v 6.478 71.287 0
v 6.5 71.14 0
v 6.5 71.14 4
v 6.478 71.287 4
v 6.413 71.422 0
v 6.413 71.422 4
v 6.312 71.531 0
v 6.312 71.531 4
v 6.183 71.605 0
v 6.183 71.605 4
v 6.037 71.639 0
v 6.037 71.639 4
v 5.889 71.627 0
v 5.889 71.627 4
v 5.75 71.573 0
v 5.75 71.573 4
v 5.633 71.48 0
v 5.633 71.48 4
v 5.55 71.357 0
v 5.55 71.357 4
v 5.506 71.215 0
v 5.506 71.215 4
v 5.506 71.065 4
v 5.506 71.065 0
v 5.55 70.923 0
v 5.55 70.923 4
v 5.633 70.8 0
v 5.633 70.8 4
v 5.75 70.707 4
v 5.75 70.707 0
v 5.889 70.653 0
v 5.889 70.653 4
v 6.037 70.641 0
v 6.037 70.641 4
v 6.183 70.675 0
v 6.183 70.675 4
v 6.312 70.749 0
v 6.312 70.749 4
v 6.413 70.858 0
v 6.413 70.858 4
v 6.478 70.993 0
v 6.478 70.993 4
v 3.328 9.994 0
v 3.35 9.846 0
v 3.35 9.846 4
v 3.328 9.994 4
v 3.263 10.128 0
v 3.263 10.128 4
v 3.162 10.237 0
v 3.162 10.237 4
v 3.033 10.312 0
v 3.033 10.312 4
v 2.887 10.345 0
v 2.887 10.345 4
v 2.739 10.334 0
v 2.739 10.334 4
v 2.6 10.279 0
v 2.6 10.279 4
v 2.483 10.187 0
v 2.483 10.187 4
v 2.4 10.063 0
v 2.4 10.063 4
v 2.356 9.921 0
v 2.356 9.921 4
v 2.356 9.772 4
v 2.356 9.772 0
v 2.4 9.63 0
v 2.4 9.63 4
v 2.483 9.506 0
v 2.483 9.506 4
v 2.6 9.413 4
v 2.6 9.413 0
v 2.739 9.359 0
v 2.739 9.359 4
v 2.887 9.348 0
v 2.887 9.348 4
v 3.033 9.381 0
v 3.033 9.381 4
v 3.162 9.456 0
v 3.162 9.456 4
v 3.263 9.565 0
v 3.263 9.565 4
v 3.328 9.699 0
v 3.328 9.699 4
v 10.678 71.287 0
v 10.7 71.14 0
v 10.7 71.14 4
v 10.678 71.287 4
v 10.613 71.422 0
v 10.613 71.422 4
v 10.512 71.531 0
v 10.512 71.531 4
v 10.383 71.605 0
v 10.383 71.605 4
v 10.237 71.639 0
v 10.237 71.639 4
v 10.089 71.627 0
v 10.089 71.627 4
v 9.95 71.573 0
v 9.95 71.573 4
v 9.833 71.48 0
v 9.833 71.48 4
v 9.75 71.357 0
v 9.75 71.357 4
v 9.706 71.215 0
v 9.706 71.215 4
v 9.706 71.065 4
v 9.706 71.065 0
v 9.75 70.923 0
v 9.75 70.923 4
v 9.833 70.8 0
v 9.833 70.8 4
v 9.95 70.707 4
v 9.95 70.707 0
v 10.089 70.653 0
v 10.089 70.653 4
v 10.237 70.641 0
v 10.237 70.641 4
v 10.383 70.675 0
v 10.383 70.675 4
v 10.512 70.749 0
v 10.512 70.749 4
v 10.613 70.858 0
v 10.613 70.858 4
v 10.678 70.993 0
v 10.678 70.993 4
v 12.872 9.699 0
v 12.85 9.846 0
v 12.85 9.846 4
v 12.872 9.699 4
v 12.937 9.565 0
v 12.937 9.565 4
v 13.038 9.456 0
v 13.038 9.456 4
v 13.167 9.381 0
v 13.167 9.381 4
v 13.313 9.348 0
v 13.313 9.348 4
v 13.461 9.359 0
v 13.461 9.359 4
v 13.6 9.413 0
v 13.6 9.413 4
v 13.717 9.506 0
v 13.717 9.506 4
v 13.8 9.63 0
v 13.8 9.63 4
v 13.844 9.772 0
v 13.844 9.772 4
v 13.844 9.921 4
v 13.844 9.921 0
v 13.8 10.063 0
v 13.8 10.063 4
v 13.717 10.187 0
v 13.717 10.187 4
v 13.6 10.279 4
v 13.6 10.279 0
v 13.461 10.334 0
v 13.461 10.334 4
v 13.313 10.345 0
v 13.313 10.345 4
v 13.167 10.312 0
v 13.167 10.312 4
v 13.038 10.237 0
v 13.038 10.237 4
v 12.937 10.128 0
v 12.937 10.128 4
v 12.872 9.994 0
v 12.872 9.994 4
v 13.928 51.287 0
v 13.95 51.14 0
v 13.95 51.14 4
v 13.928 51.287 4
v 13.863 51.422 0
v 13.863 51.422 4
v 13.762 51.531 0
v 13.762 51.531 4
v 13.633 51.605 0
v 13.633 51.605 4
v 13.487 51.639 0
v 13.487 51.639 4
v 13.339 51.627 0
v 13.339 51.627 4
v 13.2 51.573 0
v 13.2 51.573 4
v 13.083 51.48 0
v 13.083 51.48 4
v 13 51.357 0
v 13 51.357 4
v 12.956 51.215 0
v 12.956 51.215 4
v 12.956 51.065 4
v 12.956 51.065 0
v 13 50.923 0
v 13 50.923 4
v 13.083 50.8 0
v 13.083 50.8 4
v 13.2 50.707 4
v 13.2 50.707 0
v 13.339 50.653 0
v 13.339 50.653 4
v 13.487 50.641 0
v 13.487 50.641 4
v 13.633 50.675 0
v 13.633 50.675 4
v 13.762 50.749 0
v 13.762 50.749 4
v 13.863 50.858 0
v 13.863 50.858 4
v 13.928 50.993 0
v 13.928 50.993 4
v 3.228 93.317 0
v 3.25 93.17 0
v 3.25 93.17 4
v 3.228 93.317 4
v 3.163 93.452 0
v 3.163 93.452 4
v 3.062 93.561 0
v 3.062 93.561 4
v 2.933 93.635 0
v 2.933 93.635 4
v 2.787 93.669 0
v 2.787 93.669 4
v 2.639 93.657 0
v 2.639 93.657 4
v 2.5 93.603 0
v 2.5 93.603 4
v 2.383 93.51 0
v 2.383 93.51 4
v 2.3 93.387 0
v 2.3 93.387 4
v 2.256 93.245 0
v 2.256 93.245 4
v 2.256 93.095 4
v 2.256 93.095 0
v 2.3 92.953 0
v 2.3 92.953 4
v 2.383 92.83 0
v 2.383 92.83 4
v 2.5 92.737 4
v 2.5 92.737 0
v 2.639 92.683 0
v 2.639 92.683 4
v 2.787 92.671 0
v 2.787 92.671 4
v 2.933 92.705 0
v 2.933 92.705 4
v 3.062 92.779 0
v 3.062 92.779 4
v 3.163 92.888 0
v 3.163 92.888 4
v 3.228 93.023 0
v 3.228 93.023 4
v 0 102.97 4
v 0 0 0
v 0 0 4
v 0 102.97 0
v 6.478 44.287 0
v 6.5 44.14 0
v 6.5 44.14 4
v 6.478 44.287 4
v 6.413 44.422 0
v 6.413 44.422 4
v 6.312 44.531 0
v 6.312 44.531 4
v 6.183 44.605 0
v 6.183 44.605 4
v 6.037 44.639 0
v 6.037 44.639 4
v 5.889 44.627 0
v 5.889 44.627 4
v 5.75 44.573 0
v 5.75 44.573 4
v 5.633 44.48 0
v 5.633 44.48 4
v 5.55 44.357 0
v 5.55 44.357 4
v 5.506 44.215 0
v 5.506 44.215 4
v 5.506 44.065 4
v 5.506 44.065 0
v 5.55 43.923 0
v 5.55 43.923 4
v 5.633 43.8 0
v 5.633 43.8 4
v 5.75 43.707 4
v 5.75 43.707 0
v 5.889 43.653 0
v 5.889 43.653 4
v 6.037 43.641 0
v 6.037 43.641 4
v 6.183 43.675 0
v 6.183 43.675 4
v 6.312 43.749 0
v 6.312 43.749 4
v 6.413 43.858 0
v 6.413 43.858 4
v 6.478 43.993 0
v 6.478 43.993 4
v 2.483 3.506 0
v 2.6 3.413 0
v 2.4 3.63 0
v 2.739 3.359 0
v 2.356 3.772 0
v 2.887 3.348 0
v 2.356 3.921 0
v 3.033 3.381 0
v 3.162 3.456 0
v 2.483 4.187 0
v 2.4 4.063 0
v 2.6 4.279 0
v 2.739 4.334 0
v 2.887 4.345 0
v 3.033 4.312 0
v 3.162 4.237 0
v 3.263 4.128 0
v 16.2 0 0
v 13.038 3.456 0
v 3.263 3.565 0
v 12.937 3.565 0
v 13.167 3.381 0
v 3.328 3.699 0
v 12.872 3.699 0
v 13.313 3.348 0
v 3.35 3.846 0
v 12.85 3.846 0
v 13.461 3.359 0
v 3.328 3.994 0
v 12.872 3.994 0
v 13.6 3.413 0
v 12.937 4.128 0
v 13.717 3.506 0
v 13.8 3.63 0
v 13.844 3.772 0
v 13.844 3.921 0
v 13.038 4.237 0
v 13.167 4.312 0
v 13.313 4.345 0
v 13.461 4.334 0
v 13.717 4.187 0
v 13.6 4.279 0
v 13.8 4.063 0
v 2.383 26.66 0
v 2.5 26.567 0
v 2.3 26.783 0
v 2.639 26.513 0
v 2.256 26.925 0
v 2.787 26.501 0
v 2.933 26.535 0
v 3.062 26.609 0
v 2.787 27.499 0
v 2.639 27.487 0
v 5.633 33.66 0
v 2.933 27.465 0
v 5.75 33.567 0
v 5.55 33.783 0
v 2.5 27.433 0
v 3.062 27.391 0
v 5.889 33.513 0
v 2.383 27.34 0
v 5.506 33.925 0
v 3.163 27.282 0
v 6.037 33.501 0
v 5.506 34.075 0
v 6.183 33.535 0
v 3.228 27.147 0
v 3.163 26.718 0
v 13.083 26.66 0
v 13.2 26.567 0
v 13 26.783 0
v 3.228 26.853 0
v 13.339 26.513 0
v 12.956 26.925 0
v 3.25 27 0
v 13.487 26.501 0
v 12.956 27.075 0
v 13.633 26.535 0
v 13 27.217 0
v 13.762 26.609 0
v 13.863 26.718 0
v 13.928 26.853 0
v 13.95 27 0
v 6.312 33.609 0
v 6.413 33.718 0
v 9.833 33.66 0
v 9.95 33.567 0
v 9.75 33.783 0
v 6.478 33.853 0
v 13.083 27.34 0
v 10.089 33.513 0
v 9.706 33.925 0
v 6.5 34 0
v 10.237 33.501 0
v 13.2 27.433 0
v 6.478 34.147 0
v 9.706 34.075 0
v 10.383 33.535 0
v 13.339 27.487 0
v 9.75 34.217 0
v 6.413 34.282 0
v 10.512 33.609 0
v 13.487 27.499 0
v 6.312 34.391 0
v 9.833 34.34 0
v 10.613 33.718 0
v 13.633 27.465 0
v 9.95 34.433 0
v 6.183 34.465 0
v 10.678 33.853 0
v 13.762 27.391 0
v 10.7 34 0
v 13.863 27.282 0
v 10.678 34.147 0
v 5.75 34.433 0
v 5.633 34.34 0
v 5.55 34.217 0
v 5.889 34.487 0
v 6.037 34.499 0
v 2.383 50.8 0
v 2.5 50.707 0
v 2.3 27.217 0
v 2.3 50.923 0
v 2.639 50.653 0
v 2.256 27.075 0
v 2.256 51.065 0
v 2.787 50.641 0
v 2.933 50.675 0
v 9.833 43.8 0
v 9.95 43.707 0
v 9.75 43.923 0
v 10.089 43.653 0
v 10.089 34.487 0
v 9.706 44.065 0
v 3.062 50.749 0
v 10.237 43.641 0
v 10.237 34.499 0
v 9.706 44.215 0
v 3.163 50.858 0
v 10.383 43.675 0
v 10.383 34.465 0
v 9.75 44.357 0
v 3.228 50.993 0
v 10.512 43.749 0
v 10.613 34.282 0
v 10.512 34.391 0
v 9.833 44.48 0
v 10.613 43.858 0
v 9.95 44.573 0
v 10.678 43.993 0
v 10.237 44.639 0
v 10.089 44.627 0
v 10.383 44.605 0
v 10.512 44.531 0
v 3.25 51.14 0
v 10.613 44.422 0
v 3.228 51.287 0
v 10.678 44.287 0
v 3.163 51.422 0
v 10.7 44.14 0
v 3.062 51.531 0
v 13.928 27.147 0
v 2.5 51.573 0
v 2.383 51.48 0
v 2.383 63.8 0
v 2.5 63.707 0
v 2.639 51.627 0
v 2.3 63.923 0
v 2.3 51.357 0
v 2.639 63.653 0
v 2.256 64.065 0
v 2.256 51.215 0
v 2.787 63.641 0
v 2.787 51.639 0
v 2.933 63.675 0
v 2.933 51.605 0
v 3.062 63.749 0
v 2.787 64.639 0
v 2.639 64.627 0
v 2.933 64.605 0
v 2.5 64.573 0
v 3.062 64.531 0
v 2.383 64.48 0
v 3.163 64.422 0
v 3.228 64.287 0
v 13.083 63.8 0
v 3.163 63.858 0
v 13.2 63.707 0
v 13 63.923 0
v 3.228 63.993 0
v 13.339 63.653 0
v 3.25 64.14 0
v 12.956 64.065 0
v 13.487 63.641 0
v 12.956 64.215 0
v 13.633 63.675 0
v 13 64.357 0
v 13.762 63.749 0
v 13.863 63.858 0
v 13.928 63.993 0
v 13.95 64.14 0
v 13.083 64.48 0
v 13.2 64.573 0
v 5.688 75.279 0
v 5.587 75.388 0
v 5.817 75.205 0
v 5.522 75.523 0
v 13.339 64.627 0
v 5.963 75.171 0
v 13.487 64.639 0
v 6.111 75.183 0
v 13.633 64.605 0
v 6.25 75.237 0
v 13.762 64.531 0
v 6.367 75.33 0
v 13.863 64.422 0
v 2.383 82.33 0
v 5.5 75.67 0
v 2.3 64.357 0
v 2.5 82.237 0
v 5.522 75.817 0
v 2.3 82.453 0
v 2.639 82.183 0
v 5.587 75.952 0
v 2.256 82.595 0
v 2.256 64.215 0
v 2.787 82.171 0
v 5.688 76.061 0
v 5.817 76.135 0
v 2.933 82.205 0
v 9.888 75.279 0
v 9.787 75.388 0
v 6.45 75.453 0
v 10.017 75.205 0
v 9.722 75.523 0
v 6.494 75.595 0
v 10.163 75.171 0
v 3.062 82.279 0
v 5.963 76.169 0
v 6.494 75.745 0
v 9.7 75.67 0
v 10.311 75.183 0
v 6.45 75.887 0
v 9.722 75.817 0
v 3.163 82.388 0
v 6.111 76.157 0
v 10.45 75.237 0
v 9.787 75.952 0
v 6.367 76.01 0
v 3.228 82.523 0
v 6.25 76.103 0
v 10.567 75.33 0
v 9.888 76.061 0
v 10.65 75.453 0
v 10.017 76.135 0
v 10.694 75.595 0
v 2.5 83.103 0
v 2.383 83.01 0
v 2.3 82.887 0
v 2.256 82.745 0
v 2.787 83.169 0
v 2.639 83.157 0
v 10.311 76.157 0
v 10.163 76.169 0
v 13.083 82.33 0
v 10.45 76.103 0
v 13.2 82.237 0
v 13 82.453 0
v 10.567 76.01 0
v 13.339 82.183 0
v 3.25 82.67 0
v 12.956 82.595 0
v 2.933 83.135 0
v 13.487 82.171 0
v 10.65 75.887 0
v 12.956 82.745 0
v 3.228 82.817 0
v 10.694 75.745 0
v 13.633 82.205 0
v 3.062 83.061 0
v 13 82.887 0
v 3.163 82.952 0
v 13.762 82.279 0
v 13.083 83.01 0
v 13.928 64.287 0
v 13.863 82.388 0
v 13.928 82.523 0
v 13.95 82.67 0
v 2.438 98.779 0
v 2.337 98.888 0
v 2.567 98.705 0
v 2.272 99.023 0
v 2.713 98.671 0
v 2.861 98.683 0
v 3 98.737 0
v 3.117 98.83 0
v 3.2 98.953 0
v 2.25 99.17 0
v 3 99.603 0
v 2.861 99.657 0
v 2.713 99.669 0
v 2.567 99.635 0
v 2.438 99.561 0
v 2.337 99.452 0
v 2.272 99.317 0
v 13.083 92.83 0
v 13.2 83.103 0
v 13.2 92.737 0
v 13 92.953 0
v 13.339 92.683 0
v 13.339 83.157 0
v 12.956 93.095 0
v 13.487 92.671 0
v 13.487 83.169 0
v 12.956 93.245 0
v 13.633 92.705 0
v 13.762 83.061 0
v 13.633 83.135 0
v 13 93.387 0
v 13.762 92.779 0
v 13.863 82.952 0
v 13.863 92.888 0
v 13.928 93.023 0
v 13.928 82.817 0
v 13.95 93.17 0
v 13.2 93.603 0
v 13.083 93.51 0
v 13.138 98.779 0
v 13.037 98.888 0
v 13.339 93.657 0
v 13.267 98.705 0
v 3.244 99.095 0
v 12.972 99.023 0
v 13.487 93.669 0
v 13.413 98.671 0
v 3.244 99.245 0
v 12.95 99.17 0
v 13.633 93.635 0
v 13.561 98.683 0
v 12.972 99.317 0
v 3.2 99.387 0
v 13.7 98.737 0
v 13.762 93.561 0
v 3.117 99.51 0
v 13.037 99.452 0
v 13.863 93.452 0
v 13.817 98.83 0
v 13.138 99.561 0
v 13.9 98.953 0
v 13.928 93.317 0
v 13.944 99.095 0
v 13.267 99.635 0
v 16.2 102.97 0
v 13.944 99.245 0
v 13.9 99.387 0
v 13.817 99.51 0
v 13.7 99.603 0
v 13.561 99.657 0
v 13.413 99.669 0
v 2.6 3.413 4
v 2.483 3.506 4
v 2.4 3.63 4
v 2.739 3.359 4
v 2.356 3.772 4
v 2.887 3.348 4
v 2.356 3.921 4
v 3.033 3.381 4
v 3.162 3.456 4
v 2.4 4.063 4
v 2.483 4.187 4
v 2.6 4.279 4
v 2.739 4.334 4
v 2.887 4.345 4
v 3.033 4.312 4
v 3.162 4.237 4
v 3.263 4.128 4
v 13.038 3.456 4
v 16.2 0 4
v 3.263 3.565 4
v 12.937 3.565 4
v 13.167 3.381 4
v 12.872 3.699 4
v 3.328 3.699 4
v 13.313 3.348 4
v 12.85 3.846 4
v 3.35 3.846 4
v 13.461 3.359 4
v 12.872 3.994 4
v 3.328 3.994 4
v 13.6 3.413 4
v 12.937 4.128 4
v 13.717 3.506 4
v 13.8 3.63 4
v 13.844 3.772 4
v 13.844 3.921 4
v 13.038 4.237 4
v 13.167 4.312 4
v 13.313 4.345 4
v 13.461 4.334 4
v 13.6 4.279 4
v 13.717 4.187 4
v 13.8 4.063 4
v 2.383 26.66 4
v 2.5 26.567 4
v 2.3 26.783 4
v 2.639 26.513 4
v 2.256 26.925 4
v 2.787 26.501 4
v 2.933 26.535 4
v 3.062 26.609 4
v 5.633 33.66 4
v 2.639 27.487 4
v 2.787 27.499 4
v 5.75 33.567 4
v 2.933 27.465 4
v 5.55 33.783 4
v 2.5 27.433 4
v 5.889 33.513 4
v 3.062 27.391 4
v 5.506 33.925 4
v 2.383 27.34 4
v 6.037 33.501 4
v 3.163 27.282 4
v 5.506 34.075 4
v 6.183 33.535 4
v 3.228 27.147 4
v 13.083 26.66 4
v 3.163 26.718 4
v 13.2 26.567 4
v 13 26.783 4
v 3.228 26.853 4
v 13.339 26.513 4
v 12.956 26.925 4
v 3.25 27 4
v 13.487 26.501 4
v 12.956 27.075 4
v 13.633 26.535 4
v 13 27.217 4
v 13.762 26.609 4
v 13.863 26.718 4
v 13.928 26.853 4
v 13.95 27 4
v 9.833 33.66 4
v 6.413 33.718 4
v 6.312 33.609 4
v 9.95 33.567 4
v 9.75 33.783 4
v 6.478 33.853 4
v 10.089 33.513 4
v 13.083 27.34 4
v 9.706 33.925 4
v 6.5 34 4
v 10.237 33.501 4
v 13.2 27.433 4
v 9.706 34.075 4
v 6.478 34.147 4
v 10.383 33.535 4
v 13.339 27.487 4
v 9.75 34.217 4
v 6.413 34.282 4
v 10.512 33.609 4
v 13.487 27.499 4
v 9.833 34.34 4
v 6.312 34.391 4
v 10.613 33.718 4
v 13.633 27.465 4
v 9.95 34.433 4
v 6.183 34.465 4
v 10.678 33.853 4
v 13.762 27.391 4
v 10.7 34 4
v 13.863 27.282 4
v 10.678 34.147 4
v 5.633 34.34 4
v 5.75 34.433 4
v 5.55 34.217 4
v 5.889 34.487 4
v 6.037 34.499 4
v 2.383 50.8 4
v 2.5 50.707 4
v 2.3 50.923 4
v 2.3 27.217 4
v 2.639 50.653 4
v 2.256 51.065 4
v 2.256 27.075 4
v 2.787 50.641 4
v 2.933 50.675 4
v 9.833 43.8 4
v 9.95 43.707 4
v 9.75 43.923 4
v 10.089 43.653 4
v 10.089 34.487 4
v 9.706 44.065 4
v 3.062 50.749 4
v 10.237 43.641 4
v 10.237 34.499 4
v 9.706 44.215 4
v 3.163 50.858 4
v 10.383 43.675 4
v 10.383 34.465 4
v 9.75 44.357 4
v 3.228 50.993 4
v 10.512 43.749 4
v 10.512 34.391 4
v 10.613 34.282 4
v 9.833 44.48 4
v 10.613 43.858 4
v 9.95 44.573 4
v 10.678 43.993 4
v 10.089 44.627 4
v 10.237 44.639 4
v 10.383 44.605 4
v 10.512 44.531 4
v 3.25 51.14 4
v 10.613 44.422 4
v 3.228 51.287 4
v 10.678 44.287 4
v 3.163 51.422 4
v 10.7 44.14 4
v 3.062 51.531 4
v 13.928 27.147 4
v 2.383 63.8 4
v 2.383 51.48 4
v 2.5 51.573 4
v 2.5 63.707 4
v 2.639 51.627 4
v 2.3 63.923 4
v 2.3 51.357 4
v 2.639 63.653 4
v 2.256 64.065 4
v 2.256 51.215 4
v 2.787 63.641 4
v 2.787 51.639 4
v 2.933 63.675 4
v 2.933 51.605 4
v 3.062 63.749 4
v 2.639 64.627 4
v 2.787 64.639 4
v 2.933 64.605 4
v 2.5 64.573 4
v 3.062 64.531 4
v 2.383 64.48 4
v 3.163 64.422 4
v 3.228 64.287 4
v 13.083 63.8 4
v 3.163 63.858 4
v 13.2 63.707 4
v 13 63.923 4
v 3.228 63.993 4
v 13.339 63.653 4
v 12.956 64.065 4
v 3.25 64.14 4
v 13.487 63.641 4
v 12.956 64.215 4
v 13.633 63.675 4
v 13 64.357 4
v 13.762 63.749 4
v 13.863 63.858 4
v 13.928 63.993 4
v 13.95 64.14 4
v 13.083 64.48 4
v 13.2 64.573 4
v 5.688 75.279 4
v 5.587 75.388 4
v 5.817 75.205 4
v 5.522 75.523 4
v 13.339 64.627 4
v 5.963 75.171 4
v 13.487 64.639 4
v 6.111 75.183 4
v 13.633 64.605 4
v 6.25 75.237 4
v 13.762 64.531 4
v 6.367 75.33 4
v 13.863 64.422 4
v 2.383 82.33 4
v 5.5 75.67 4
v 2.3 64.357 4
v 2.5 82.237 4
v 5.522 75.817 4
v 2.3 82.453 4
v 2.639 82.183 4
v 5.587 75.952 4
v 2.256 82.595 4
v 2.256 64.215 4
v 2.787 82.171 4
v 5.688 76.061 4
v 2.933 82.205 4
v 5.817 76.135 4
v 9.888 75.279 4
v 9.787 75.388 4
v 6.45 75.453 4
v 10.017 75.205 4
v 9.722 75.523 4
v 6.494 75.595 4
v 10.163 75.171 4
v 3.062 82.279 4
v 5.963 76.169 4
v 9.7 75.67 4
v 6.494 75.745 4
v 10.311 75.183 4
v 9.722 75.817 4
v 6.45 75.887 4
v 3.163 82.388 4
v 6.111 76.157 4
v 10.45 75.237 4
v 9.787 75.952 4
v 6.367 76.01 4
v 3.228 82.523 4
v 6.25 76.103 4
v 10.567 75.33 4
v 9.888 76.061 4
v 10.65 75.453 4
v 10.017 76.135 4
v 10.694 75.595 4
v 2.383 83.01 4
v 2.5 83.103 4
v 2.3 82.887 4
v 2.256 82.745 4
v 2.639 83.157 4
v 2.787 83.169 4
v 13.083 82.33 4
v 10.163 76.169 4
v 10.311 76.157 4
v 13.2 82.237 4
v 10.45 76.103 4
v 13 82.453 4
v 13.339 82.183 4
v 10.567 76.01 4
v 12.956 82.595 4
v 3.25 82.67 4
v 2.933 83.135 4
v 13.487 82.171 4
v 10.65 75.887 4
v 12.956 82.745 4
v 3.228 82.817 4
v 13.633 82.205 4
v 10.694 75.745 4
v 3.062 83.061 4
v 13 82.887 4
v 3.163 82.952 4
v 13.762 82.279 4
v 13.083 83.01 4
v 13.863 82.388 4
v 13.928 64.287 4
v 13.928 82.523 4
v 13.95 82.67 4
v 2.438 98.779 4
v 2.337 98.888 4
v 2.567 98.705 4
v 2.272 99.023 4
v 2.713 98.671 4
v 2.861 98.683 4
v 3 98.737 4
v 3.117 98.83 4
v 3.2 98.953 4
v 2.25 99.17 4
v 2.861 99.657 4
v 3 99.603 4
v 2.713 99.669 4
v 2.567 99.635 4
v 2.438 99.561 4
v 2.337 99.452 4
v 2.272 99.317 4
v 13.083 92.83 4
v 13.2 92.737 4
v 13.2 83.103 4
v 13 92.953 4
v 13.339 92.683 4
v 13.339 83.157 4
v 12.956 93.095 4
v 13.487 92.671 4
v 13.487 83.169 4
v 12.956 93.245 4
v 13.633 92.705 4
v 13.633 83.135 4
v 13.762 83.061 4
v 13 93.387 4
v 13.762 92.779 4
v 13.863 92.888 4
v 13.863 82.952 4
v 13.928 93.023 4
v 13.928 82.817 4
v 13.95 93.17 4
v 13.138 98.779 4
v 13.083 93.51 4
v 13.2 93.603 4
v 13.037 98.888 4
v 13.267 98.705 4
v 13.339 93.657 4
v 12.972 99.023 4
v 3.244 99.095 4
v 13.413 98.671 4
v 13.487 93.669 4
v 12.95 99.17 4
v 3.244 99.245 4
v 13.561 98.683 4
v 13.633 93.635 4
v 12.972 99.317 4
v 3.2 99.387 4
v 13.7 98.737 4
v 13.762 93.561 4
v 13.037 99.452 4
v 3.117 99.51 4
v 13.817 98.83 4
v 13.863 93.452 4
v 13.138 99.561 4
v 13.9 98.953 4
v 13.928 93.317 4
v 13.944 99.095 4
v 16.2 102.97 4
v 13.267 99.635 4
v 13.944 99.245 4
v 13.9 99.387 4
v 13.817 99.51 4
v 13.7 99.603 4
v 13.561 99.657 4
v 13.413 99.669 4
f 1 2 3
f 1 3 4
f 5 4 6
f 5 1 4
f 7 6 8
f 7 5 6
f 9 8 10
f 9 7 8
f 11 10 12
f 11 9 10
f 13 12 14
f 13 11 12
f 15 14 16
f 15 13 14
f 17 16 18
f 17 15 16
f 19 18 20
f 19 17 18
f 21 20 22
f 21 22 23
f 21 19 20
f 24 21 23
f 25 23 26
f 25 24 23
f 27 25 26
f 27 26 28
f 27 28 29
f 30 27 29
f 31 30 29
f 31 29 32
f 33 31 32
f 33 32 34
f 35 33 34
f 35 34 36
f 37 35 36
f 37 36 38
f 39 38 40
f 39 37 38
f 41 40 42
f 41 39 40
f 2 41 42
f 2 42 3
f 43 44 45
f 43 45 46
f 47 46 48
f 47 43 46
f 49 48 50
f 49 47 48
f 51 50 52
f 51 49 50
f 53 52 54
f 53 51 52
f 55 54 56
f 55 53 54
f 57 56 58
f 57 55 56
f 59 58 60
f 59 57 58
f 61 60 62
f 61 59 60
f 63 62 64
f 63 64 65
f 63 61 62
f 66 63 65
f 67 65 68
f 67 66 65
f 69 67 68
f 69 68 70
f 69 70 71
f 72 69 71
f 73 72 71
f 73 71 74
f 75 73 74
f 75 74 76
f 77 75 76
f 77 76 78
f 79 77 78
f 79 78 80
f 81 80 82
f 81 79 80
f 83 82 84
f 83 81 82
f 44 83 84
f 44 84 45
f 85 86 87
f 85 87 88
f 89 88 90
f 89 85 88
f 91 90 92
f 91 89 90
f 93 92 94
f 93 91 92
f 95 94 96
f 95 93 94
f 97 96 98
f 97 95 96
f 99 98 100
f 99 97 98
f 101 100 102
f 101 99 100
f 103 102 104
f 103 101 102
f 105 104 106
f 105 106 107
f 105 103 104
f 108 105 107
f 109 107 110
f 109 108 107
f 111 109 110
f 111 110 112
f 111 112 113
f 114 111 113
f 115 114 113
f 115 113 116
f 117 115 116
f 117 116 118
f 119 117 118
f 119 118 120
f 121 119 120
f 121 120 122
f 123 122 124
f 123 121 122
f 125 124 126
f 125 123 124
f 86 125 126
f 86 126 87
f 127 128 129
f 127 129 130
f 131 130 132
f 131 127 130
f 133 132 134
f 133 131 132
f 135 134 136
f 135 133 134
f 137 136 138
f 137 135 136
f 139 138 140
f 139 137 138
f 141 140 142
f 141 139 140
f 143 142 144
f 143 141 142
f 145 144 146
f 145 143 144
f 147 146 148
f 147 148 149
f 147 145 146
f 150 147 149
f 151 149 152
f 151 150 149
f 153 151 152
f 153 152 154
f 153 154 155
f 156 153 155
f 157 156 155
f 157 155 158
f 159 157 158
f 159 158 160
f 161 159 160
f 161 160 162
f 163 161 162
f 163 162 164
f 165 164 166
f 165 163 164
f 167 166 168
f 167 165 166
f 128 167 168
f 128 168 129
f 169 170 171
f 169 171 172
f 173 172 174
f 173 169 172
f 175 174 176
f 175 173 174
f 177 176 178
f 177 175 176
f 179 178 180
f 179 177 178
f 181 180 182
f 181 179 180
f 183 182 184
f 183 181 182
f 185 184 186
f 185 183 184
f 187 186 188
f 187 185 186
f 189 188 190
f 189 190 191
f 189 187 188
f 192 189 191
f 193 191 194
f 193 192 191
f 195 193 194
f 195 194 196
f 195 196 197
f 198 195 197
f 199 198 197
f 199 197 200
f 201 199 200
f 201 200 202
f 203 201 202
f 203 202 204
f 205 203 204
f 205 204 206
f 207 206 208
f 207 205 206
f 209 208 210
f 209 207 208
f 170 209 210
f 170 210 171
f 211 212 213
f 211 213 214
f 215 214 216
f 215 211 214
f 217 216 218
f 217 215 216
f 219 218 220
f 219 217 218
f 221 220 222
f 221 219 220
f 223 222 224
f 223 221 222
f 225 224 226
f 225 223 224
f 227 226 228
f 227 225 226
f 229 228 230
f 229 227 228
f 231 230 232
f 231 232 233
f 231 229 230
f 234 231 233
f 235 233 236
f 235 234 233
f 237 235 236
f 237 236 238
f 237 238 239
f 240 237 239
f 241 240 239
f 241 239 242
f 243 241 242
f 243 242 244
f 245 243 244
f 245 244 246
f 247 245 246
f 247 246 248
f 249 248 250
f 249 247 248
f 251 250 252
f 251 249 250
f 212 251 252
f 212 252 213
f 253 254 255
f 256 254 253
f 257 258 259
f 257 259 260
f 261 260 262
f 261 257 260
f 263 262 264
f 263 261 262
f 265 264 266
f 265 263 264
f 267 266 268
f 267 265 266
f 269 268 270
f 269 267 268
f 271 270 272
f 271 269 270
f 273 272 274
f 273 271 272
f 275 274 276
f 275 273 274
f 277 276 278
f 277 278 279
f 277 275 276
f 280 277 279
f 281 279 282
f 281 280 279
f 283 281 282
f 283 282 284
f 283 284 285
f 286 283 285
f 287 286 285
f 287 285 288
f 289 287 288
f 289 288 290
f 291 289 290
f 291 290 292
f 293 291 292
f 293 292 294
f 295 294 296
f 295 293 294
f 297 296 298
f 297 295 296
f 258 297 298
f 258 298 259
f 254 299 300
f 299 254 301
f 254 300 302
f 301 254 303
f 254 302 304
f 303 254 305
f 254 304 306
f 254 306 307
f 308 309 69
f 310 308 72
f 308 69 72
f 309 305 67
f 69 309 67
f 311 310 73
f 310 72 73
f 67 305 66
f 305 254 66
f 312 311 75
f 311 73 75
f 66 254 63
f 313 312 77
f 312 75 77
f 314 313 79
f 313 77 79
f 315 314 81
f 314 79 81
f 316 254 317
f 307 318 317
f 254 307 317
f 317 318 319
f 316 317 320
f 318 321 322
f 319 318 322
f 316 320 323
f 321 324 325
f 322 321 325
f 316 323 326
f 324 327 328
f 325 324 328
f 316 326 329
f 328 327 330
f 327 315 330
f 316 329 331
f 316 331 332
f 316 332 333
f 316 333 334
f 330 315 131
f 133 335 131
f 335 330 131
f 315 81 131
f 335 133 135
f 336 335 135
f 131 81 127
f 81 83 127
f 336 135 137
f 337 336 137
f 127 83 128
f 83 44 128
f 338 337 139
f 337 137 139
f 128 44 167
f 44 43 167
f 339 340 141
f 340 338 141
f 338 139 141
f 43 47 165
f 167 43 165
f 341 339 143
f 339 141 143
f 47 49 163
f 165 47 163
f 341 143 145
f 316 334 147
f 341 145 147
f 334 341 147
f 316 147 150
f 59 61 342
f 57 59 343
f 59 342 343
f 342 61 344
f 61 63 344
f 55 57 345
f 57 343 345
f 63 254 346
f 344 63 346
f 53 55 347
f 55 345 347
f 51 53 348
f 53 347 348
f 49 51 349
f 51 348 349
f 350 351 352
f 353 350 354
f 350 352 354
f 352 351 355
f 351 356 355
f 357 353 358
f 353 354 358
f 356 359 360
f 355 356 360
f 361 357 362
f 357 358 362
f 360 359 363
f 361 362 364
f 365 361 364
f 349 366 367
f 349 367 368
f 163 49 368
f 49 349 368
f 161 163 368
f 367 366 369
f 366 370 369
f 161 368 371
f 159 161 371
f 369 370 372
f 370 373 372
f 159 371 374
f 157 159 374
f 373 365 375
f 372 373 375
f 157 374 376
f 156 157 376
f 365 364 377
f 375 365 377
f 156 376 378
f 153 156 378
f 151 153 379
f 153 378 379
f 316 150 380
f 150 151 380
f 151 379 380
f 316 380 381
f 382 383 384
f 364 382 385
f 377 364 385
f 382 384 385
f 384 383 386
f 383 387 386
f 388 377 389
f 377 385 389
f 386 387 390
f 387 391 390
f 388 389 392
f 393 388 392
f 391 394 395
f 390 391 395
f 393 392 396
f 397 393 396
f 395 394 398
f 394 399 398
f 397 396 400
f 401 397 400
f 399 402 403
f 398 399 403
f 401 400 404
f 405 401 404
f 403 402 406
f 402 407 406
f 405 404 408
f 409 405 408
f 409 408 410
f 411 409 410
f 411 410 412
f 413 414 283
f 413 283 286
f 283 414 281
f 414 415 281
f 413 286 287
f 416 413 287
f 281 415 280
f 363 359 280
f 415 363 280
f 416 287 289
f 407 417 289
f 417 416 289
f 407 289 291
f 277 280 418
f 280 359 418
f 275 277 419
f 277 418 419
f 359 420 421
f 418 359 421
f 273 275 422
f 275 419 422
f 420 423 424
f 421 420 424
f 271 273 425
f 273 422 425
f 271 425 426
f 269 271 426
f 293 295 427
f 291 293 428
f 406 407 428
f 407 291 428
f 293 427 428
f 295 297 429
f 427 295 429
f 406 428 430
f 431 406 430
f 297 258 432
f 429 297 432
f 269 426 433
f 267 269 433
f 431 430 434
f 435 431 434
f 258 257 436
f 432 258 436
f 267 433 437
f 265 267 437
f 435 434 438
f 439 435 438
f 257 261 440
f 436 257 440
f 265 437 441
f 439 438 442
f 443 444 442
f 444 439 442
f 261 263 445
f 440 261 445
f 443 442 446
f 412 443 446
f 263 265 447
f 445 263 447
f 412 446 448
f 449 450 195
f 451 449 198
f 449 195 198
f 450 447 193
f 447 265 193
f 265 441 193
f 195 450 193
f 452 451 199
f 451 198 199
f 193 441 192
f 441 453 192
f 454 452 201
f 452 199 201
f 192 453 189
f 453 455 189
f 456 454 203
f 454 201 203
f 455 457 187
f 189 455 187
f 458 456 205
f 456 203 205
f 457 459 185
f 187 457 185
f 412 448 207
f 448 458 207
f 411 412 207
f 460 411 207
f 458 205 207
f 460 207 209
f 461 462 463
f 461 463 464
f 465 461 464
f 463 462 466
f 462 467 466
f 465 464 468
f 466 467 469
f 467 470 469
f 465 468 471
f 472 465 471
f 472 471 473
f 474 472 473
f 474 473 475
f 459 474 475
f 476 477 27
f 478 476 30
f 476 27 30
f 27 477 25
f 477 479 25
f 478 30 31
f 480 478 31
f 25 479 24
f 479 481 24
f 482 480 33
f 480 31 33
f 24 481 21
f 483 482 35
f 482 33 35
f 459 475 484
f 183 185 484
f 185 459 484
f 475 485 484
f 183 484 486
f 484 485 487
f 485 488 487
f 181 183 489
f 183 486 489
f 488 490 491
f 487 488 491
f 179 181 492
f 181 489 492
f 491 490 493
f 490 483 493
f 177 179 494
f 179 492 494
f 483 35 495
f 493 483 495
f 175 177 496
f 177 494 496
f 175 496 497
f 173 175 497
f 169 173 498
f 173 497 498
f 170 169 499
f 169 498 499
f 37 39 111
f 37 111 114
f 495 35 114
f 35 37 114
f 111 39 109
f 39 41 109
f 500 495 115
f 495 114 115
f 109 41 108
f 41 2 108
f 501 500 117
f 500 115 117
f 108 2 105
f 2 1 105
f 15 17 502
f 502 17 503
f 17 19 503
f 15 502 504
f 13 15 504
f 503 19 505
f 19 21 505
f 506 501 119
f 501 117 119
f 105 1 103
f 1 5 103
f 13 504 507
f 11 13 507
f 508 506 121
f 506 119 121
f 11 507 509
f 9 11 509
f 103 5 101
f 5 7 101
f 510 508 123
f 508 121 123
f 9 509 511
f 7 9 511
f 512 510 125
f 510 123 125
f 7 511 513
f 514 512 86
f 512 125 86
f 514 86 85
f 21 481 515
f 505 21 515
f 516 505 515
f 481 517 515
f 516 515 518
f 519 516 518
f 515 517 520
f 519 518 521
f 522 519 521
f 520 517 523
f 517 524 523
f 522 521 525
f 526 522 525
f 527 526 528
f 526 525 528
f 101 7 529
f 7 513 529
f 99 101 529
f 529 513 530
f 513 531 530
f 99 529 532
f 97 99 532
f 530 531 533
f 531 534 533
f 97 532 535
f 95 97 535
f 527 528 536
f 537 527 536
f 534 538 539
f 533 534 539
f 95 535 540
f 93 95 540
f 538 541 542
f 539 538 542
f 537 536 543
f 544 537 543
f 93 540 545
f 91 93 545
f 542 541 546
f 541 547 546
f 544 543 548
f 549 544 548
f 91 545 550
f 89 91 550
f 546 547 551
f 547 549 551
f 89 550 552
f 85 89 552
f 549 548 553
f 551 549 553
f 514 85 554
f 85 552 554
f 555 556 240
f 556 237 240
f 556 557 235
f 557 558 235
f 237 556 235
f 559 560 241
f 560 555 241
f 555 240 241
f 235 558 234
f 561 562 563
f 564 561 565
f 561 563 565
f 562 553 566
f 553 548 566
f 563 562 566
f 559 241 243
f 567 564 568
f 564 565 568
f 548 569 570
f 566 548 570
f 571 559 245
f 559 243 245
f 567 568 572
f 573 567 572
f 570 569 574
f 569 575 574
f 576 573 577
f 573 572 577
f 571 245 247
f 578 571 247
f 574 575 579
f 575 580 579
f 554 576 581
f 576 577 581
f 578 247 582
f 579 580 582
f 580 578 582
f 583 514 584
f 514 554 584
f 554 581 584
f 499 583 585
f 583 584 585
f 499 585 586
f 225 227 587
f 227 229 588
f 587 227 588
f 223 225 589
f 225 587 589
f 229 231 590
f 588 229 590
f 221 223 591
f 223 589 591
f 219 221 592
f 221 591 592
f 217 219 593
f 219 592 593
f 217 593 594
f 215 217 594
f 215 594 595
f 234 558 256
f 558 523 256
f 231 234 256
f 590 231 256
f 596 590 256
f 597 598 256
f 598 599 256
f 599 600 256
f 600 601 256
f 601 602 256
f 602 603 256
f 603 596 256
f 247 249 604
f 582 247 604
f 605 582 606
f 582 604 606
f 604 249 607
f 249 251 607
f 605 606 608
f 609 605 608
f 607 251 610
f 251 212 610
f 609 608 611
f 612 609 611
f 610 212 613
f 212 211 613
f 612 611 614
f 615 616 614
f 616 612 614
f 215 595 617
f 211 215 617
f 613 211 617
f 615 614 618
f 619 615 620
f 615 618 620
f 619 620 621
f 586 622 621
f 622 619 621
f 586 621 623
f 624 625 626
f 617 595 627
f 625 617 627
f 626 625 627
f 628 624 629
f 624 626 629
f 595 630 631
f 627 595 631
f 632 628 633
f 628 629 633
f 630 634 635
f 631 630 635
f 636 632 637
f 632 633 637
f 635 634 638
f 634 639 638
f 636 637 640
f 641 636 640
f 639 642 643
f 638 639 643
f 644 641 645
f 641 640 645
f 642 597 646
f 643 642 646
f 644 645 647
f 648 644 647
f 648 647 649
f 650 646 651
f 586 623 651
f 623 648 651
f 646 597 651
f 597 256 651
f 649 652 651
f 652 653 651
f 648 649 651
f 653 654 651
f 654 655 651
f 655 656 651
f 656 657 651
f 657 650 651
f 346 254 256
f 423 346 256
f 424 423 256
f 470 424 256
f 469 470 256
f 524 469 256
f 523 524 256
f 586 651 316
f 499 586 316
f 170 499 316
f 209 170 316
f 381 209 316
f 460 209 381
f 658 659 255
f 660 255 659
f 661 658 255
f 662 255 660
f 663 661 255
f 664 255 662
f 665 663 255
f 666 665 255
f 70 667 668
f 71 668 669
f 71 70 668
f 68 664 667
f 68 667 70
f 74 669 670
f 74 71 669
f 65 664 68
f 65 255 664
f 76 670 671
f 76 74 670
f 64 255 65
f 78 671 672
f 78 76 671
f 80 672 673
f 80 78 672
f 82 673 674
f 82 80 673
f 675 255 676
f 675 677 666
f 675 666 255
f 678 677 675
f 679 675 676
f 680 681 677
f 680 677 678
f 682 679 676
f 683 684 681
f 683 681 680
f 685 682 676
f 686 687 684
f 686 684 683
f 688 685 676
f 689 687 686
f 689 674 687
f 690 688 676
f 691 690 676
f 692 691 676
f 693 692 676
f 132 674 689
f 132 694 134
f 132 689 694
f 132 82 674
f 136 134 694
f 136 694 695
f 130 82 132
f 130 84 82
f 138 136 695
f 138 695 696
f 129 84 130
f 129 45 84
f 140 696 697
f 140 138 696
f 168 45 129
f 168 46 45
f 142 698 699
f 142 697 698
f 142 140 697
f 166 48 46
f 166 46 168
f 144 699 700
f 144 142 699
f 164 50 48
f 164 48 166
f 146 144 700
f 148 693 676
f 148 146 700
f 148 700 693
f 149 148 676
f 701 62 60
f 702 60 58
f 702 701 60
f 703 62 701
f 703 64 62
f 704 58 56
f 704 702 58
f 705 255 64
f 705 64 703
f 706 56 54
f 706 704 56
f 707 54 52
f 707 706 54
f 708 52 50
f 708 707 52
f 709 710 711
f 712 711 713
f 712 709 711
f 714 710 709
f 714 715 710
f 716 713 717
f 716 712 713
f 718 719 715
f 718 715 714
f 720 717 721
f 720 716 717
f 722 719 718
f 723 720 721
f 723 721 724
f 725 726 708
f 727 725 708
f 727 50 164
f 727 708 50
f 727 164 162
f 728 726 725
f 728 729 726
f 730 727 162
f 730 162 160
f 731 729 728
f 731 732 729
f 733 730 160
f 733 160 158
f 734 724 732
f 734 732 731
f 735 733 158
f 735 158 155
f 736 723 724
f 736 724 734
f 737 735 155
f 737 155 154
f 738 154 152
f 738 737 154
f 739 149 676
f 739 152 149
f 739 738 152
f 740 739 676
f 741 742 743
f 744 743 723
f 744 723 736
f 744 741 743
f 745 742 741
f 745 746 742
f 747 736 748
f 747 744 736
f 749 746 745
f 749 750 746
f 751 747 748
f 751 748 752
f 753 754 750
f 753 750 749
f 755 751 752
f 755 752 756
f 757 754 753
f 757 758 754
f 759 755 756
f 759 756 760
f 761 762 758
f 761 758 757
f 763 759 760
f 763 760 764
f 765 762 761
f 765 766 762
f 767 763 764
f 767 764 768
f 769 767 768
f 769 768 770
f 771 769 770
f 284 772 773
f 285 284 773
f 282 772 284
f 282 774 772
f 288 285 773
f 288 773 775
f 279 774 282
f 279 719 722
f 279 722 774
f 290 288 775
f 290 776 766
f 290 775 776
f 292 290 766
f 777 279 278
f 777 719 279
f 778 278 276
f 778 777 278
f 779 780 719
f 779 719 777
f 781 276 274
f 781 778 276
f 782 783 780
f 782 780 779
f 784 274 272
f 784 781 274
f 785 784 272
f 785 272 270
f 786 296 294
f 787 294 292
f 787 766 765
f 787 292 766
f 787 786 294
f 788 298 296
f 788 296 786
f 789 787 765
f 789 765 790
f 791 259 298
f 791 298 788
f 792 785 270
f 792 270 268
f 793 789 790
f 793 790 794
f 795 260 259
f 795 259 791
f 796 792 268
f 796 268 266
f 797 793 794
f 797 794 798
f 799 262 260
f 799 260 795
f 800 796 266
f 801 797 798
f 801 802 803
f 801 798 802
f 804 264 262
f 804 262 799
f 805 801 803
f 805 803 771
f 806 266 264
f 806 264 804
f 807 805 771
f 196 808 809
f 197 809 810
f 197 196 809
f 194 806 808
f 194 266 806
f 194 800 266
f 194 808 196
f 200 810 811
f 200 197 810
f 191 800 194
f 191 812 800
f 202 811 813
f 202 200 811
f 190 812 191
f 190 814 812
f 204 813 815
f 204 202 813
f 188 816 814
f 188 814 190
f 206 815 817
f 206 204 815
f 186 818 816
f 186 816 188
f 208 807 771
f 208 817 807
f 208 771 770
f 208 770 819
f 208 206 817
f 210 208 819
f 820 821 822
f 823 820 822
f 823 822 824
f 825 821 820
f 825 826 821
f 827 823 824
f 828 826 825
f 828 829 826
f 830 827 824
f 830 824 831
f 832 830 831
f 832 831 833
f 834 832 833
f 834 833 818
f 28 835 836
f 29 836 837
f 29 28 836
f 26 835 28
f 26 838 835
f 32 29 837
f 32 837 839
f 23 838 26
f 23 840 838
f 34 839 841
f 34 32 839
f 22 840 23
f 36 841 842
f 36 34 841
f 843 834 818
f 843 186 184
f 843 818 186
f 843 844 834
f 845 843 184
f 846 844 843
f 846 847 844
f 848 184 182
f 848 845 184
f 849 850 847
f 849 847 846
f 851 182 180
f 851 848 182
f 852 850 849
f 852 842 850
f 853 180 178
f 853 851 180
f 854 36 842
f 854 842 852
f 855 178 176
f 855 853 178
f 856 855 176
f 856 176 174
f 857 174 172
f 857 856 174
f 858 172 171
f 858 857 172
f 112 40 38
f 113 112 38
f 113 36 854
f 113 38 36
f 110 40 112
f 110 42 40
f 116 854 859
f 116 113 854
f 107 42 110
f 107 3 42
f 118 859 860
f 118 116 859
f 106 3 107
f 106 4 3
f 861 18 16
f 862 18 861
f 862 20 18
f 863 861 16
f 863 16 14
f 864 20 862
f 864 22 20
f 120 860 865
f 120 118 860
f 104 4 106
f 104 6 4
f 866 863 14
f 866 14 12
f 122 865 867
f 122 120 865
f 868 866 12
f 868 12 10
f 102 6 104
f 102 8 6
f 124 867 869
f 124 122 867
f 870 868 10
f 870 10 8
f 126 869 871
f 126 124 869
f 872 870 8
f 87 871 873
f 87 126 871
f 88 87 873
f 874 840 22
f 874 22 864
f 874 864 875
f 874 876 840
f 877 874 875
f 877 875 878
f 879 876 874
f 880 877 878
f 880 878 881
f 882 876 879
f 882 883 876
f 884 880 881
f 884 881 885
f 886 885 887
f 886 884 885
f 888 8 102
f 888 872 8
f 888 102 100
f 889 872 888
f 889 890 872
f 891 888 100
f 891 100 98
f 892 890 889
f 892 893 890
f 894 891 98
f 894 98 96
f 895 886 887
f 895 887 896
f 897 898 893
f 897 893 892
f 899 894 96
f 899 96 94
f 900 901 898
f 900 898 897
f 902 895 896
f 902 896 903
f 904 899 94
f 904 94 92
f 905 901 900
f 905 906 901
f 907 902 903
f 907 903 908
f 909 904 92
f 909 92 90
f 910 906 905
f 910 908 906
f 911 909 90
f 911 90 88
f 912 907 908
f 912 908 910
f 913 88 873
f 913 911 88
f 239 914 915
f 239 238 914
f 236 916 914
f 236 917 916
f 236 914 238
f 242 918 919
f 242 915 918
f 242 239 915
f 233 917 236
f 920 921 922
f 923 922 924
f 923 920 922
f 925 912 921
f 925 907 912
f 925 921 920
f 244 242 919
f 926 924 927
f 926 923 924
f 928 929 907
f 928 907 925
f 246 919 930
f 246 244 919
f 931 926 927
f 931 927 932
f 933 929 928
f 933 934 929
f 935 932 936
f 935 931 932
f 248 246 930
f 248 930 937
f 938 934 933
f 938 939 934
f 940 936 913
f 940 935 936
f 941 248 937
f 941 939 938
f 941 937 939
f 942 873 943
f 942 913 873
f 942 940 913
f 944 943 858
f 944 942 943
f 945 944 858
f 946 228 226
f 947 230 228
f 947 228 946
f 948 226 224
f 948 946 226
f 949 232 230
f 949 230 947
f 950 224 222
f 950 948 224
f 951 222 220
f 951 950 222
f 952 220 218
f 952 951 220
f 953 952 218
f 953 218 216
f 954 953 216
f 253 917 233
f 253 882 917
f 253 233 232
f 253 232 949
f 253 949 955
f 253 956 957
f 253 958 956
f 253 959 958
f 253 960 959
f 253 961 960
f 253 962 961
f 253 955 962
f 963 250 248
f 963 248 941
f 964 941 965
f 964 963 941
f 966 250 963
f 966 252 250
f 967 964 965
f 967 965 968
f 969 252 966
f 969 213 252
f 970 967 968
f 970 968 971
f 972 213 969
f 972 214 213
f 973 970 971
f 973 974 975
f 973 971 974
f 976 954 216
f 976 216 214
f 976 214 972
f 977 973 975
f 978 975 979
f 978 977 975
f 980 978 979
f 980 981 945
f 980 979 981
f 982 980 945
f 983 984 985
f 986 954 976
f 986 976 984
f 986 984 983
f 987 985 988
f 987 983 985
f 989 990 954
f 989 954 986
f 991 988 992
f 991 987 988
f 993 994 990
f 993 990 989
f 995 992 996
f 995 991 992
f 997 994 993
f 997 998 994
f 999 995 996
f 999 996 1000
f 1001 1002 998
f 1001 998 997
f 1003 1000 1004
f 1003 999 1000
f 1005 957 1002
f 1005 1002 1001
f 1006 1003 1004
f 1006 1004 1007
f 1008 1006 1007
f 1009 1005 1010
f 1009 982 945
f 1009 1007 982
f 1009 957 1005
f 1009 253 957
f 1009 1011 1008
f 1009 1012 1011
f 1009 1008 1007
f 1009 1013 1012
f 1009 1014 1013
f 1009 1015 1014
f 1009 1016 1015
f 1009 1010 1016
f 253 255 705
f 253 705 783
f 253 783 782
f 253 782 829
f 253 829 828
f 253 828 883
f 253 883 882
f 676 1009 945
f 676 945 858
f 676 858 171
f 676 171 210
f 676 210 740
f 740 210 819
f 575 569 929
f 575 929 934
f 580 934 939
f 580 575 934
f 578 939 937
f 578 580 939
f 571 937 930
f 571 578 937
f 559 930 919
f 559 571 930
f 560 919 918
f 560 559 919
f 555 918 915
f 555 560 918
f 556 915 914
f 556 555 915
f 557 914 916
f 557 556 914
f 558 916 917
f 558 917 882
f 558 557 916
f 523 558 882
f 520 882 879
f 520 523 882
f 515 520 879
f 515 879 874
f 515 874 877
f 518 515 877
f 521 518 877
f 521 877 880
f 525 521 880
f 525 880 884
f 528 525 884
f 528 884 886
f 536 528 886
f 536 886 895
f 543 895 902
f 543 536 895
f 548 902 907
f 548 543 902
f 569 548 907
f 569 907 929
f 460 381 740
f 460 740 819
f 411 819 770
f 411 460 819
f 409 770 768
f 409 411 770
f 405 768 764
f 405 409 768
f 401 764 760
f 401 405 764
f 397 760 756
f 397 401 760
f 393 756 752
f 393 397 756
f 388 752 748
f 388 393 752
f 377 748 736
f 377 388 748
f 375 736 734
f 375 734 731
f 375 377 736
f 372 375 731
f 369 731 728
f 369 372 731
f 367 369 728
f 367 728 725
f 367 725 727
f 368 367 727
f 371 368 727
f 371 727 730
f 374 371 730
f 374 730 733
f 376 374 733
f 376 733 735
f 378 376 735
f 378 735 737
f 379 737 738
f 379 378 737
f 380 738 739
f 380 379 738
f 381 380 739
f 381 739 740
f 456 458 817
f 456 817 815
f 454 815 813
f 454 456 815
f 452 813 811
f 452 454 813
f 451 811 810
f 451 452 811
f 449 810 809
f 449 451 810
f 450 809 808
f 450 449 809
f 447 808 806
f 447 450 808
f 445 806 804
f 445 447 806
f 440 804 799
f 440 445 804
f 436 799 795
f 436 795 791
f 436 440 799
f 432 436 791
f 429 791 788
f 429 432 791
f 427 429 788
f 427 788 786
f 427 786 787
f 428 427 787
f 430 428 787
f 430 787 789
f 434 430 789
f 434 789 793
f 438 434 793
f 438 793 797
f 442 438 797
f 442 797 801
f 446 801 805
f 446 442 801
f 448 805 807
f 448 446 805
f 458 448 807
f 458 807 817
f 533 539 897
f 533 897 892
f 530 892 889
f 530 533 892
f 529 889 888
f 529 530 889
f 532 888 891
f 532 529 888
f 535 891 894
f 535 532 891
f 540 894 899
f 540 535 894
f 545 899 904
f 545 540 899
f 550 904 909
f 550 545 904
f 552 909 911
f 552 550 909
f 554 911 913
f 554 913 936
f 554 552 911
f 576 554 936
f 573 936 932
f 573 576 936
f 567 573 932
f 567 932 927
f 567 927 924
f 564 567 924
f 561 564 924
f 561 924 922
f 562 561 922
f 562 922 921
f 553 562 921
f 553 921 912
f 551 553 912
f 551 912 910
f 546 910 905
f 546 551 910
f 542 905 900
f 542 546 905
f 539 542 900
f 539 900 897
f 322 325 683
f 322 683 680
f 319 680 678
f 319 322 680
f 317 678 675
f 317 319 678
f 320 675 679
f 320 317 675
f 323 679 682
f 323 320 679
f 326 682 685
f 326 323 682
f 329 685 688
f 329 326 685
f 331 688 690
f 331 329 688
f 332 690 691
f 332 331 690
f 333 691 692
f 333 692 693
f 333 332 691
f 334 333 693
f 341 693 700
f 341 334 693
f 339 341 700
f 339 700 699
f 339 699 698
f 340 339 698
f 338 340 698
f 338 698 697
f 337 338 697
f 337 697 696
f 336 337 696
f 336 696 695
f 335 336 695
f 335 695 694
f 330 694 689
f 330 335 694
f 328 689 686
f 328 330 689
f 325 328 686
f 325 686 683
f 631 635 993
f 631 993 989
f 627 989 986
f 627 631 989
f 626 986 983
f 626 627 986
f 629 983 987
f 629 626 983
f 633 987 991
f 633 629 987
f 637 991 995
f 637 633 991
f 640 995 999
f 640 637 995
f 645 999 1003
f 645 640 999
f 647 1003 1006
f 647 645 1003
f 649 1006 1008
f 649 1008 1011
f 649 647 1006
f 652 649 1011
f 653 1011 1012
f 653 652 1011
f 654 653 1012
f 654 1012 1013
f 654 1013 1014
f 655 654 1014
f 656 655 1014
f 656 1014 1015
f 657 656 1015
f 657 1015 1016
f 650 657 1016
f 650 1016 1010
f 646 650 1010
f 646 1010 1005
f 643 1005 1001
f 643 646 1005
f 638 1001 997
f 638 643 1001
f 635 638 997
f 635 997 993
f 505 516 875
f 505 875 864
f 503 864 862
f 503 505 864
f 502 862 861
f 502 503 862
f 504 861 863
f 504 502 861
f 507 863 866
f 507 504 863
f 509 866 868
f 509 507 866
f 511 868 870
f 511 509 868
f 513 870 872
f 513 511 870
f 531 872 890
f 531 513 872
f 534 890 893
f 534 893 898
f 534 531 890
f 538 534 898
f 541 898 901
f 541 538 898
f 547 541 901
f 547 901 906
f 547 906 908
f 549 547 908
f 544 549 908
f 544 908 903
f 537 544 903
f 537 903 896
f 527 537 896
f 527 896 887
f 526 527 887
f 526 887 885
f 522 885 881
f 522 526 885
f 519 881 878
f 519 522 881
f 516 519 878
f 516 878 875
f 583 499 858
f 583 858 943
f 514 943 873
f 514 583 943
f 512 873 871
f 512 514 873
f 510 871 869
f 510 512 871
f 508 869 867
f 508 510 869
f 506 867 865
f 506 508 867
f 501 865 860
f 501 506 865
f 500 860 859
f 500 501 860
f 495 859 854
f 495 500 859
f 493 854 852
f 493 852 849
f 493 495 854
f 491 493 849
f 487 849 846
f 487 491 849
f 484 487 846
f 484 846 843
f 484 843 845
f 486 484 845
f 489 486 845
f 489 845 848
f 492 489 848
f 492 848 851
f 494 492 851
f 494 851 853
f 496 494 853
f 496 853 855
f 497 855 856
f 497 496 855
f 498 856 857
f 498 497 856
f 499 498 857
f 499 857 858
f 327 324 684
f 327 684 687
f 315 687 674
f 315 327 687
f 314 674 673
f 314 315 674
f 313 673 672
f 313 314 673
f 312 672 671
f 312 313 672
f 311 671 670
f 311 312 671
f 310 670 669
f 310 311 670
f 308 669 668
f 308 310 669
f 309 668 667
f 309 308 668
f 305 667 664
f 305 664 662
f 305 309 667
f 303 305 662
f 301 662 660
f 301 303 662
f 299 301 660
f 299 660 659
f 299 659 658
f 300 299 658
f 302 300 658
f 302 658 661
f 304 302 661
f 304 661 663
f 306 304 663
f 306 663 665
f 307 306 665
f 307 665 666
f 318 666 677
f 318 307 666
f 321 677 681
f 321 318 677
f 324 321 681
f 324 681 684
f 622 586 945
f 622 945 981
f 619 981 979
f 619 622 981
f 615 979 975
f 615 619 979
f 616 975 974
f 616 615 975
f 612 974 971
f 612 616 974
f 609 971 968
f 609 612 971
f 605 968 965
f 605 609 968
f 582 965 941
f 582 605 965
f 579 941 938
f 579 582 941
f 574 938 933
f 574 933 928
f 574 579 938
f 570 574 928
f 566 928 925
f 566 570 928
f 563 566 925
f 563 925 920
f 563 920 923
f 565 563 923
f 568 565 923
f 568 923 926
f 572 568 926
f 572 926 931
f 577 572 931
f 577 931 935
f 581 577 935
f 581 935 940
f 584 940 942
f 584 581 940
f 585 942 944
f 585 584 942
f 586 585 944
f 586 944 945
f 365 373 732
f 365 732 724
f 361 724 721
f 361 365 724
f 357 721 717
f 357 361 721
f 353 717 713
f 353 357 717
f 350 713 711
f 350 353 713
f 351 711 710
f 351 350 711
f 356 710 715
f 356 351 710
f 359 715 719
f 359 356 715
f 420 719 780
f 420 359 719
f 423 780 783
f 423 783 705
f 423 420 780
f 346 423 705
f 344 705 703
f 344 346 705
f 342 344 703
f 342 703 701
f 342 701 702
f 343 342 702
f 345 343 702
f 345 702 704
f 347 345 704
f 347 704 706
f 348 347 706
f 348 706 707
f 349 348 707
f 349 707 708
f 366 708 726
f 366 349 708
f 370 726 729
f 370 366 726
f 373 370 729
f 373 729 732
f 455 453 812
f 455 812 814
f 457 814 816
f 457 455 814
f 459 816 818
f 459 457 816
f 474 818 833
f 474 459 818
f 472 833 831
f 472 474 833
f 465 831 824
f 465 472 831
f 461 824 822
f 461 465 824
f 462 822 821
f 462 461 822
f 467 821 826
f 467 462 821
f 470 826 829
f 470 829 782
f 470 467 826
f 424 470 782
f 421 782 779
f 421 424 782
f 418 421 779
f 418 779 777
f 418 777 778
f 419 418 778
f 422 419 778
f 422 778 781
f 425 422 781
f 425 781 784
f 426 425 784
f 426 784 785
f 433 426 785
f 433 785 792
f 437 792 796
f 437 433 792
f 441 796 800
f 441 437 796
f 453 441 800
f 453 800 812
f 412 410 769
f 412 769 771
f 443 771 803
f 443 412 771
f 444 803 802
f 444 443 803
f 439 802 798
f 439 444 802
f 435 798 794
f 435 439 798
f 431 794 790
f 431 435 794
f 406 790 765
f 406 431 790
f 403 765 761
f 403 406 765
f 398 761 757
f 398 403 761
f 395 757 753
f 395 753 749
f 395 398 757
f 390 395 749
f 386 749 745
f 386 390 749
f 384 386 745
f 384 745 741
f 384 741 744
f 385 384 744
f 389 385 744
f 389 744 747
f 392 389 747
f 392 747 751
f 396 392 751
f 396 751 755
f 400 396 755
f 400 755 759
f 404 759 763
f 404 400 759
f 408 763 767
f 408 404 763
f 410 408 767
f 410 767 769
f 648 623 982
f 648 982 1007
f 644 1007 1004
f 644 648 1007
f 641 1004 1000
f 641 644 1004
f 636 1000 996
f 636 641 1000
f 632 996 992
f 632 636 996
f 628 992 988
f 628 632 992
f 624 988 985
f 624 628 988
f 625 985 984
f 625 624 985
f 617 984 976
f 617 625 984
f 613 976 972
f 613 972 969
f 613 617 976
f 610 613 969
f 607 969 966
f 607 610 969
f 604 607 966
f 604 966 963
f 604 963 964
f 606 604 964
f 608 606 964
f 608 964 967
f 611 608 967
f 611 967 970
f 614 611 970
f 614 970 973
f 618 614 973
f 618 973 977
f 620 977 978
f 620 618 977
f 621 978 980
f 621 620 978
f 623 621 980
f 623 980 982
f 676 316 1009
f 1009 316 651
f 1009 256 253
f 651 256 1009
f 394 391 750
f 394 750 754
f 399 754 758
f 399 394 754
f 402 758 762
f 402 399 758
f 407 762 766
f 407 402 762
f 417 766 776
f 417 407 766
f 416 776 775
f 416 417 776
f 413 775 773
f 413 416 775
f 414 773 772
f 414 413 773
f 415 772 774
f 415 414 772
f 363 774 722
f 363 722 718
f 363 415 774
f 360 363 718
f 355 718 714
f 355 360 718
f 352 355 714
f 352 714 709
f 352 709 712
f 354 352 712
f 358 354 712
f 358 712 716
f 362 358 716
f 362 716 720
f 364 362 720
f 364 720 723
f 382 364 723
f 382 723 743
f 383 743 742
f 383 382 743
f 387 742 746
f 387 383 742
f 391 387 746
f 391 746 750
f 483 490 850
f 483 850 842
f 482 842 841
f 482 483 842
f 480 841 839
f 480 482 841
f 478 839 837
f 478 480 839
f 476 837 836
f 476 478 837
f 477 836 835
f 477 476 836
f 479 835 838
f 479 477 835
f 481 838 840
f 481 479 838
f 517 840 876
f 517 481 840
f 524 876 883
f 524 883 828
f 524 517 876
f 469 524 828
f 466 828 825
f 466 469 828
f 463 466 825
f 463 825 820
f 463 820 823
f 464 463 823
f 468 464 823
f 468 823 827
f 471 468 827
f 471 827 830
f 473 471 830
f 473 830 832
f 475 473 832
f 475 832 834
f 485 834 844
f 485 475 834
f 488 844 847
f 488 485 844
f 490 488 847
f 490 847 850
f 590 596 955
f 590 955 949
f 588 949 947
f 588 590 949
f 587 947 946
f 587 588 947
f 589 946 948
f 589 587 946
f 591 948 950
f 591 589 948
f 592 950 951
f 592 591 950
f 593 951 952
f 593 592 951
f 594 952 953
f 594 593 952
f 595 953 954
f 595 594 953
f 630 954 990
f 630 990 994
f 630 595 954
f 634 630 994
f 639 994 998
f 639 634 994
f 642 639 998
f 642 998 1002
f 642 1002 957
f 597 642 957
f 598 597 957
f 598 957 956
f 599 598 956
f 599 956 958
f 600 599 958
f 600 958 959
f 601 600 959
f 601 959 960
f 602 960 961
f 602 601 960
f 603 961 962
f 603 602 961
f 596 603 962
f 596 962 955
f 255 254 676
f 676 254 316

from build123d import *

# Parameters (mm, degrees)
SKETCH1_W           = 16.2
SKETCH1_H           = 102.97
SKETCH1_R           = 0.5
BOSS_EXTRUDE1_DEPTH = 4


with BuildPart() as part:
    # Sketch1 → Boss-Extrude1 (new body)
    with BuildSketch(Plane.XY):
        with Locations((8.1, 51.485)):
            Rectangle(SKETCH1_W, SKETCH1_H)
        with Locations((10.2, 71.14)):
            Circle(SKETCH1_R, mode=Mode.SUBTRACT)
        with Locations((13.45, 51.14)):
            Circle(SKETCH1_R, mode=Mode.SUBTRACT)
        with Locations((13.45, 93.17)):
            Circle(SKETCH1_R, mode=Mode.SUBTRACT)
        with Locations((6, 71.14)):
            Circle(SKETCH1_R, mode=Mode.SUBTRACT)
        with Locations(Location((2.75, 99.17, 0), (0, 0, 180))):
            Circle(SKETCH1_R, mode=Mode.SUBTRACT)
        with Locations(Location((6, 75.67, 0), (0, 0, 180))):
            Circle(SKETCH1_R, mode=Mode.SUBTRACT)
        with Locations((2.75, 51.14)):
            Circle(SKETCH1_R, mode=Mode.SUBTRACT)
        with Locations((6, 44.14)):
            Circle(SKETCH1_R, mode=Mode.SUBTRACT)
        with Locations((13.45, 27)):
            Circle(SKETCH1_R, mode=Mode.SUBTRACT)
        with Locations(Location((10.2, 75.67, 0), (0, 0, 180))):
            Circle(SKETCH1_R, mode=Mode.SUBTRACT)
        with Locations((6, 34)):
            Circle(SKETCH1_R, mode=Mode.SUBTRACT)
        with Locations((2.75, 27)):
            Circle(SKETCH1_R, mode=Mode.SUBTRACT)
        with Locations((2.75, 93.17)):
            Circle(SKETCH1_R, mode=Mode.SUBTRACT)
        with Locations((13.45, 82.67)):
            Circle(SKETCH1_R, mode=Mode.SUBTRACT)
        with Locations((13.45, 64.14)):
            Circle(SKETCH1_R, mode=Mode.SUBTRACT)
        with Locations(Location((13.45, 99.17, 0), (0, 0, 180))):
            Circle(SKETCH1_R, mode=Mode.SUBTRACT)
        with Locations((10.2, 44.14)):
            Circle(SKETCH1_R, mode=Mode.SUBTRACT)
        with Locations((2.75, 82.67)):
            Circle(SKETCH1_R, mode=Mode.SUBTRACT)
        with Locations((2.85, 9.846448831)):
            Circle(SKETCH1_R, mode=Mode.SUBTRACT)
        with Locations(Location((13.35, 9.846448831, 0), (0, 0, 180))):
            Circle(SKETCH1_R, mode=Mode.SUBTRACT)
        with Locations(Location((13.35, 3.846448831, 0), (0, 0, 180))):
            Circle(SKETCH1_R, mode=Mode.SUBTRACT)
        with Locations((2.85, 3.846448831)):
            Circle(SKETCH1_R, mode=Mode.SUBTRACT)
        with Locations((2.75, 64.14)):
            Circle(SKETCH1_R, mode=Mode.SUBTRACT)
        with Locations((10.2, 34)):
            Circle(SKETCH1_R, mode=Mode.SUBTRACT)
    extrude(amount=BOSS_EXTRUDE1_DEPTH)


solid = part.part
